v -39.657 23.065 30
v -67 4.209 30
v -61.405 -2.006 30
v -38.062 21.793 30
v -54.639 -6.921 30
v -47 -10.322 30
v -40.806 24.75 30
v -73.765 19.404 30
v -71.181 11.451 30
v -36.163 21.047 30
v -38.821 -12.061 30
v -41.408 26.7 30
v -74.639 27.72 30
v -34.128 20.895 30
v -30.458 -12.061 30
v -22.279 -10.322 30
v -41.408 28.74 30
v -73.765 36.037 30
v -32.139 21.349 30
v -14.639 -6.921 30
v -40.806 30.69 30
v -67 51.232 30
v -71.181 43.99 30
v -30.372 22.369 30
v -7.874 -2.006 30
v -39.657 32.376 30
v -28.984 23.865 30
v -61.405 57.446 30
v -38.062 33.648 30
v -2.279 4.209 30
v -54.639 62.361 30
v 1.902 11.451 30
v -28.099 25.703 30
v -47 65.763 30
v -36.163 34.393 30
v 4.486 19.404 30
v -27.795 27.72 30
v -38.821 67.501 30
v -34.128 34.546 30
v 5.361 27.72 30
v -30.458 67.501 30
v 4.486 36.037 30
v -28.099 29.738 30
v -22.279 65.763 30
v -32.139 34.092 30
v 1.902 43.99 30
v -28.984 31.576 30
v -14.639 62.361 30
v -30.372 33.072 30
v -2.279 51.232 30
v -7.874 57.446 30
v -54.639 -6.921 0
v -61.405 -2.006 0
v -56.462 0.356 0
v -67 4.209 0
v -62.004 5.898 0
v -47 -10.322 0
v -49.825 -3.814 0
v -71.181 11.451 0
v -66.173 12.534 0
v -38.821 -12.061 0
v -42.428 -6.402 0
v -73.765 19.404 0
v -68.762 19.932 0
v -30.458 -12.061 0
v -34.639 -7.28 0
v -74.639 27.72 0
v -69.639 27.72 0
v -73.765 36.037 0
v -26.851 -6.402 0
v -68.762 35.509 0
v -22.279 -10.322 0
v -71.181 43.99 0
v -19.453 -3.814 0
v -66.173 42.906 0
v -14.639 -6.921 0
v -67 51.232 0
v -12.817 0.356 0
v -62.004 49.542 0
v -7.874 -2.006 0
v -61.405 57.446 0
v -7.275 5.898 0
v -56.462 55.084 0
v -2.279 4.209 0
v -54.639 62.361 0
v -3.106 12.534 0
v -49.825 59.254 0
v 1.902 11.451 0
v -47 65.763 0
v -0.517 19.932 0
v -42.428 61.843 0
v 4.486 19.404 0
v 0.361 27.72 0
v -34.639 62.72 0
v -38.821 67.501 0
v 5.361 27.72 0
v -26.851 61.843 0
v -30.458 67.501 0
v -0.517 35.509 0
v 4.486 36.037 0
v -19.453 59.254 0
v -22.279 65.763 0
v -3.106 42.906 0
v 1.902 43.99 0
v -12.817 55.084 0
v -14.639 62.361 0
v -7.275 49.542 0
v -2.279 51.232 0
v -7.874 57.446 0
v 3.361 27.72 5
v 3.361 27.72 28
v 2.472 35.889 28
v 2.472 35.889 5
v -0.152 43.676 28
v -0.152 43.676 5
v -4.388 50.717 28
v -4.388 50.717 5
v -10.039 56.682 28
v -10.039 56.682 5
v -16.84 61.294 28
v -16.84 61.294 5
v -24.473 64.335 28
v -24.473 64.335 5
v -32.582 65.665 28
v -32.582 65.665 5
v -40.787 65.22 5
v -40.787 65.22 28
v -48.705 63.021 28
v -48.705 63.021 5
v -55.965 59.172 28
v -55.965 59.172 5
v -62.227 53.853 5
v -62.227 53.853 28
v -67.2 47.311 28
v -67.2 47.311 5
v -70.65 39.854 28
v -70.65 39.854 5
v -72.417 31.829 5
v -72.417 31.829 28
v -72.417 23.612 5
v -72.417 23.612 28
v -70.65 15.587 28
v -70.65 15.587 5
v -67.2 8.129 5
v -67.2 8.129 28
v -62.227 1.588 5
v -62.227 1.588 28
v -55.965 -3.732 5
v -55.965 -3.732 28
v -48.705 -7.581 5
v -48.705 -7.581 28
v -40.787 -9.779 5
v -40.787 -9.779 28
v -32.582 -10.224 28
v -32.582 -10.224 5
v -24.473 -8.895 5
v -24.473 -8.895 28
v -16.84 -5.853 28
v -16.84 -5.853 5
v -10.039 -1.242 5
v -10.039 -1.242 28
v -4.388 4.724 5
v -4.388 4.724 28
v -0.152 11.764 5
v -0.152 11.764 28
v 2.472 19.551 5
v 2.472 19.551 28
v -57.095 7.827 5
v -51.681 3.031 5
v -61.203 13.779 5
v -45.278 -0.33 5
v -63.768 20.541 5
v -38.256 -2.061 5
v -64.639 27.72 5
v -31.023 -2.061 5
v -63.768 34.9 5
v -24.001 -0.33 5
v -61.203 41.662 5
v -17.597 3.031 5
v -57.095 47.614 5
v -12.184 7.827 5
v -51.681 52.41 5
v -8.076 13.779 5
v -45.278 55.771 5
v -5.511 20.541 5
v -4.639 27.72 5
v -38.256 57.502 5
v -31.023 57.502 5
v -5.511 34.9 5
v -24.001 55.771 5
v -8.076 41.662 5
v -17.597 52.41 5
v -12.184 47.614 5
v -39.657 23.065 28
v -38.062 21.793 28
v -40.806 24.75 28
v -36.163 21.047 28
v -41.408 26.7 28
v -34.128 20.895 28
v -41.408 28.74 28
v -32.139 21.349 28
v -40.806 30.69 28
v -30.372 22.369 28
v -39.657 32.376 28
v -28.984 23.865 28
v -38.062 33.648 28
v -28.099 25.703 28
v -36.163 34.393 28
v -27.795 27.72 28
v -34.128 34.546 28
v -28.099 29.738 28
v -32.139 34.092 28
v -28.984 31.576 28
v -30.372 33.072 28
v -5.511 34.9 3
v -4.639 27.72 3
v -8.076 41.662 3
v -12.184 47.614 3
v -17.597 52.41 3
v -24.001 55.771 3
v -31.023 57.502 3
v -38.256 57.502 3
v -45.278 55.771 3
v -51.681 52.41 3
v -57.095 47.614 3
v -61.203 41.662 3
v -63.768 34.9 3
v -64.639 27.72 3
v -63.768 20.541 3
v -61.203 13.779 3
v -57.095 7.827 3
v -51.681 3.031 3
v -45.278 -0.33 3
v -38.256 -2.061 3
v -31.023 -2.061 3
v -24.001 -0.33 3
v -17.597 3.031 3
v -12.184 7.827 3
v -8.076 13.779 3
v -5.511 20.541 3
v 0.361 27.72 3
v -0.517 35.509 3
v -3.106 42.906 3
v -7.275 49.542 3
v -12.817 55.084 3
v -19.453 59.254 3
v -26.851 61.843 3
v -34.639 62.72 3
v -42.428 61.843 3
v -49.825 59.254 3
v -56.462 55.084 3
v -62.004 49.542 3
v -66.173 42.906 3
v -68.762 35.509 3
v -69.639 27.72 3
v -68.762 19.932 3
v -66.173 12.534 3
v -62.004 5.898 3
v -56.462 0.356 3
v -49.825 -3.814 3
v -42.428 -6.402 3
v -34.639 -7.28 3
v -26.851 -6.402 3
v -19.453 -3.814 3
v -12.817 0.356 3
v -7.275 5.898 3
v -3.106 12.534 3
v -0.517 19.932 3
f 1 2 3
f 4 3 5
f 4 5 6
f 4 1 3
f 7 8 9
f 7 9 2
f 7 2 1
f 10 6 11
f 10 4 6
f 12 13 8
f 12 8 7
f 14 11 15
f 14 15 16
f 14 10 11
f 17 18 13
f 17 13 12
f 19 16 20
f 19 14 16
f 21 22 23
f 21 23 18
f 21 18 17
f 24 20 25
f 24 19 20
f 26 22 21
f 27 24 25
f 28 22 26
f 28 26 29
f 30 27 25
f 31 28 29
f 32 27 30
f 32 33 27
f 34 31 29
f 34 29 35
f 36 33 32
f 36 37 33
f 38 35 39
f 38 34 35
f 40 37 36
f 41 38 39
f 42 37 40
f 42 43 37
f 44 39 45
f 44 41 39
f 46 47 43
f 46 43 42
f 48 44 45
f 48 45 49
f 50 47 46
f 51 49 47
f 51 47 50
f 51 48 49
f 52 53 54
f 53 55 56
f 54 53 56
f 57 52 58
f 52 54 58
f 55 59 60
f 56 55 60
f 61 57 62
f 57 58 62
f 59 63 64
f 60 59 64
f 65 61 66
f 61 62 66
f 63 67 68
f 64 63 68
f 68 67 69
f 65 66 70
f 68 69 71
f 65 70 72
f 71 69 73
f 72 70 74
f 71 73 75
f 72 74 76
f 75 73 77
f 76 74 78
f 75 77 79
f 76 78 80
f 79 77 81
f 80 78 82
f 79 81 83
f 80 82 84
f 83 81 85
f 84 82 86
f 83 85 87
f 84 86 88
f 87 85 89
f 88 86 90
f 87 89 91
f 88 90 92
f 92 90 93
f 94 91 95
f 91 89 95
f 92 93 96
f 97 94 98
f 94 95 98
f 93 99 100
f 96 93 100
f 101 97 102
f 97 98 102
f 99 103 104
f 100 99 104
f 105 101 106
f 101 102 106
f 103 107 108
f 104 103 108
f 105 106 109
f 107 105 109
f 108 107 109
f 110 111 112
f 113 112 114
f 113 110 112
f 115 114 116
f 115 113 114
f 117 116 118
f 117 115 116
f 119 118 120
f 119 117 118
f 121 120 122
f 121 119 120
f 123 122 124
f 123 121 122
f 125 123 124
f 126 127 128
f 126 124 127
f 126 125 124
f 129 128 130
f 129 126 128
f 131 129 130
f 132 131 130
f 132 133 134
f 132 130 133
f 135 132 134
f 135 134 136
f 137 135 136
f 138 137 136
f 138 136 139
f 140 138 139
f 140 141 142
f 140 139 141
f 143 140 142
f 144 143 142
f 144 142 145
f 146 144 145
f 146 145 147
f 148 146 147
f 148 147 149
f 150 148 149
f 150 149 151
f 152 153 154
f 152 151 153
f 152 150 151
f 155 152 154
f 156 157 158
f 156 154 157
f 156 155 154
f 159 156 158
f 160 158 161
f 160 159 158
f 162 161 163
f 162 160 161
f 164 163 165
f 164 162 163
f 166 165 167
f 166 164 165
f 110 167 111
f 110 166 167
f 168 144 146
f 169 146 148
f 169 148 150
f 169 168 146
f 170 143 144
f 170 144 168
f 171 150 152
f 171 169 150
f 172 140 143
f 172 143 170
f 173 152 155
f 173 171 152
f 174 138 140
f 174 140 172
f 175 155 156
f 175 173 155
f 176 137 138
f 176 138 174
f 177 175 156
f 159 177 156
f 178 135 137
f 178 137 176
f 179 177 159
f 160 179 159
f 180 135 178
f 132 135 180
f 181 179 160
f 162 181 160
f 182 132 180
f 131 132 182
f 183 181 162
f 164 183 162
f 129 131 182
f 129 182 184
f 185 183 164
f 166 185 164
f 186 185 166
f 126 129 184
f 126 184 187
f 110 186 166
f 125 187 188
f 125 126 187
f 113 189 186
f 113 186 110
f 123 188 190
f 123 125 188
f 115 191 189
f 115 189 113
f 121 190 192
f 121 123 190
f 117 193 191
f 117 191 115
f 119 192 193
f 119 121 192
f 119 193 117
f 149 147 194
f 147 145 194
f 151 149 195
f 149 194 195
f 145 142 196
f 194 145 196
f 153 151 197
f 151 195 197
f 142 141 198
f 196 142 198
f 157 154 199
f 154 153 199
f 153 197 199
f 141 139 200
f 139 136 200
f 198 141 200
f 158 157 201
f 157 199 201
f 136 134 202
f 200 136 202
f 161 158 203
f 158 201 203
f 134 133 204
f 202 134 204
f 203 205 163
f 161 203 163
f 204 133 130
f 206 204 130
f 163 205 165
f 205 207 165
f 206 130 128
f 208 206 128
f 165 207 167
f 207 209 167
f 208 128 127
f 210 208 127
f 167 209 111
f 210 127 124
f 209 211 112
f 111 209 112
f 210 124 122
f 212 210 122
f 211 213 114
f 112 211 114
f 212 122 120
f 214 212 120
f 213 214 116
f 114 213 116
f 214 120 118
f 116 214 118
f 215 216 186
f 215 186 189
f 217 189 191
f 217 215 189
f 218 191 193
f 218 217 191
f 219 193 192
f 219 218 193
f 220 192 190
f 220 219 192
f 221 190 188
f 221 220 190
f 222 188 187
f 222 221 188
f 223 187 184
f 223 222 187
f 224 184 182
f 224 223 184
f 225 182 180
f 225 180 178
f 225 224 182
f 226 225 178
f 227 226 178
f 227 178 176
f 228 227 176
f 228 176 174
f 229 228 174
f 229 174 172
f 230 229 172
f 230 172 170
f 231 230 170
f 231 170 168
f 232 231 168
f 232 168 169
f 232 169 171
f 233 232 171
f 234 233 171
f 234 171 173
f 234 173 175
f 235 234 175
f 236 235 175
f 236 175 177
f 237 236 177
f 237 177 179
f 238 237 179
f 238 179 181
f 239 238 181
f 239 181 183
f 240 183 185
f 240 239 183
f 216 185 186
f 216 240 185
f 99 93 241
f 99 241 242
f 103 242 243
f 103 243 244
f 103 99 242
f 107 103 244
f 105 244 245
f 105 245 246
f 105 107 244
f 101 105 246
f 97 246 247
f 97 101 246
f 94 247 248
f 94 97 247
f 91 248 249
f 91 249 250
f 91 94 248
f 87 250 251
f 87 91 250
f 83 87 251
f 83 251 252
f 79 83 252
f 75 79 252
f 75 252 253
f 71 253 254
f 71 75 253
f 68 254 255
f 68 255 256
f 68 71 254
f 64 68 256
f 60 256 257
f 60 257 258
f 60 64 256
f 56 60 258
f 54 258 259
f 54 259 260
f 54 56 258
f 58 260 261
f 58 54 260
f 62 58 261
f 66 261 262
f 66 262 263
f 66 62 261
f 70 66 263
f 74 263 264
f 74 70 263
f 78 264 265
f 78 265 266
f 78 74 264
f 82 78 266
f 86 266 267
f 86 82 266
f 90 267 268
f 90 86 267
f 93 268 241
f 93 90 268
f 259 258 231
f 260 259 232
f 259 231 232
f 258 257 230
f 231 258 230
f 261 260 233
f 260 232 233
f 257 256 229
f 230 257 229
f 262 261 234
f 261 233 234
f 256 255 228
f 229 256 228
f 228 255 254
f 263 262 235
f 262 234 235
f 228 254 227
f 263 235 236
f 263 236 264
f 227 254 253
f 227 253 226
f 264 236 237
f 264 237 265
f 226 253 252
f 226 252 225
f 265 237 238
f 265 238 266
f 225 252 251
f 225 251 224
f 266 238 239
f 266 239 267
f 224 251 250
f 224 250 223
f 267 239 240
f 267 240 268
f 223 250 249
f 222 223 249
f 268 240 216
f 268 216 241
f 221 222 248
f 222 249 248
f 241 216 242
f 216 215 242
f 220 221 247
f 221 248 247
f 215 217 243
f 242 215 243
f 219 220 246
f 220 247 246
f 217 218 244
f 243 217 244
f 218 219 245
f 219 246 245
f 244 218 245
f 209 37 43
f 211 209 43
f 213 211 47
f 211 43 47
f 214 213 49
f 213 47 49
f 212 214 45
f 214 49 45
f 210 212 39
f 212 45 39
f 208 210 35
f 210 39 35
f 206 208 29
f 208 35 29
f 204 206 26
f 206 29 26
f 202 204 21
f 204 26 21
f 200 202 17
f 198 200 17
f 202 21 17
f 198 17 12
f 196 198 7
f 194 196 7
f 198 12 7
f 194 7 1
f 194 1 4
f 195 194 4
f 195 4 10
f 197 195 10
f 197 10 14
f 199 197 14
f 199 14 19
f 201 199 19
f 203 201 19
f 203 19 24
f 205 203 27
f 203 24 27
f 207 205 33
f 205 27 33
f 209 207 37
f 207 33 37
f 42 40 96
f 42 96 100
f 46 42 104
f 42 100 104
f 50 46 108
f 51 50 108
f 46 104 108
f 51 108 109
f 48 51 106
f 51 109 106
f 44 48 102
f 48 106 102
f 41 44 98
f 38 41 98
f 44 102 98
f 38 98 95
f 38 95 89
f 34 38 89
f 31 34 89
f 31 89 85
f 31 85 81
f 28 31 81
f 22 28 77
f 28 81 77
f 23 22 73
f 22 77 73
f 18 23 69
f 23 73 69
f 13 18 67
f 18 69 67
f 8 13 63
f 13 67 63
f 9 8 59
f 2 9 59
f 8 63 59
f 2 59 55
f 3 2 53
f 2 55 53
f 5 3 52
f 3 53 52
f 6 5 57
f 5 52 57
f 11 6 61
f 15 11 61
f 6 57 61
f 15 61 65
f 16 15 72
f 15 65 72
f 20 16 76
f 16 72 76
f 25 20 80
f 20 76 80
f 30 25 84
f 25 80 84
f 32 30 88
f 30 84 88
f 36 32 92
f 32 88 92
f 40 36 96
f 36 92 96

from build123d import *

# Parameters (mm, degrees)
F0_R     = 40
F0_R_2   = 38
F1_DEPTH = 30
F0_R_3   = 35
F0_R_4   = 30
F2_DEPTH = 5
F3_DEPTH = 3
F4_R     = 39.94757
F4_R_2   = 38
F4_R_3   = 6.844731
F5_DEPTH = 2


with BuildPart() as f1:
    # F0 (on Top) → F1 (new body)
    with BuildSketch(Plane.XY):
        with Locations((-34.639411, 27.720276)):
            Circle(F0_R)
        with Locations((-34.639411, 27.720276)):
            Circle(F0_R_2, mode=Mode.SUBTRACT)
    extrude(amount=F1_DEPTH)

    # F0 (on Top) → F2 (join)
    with BuildSketch(Plane.XY):
        with Locations((-34.639411, 27.720276)):
            Circle(F0_R_2)
        with Locations((-34.639411, 27.720276)):
            Circle(F0_R_3, mode=Mode.SUBTRACT)
        with Locations((-34.639411, 27.720276)):
            Circle(F0_R_3)
        with Locations((-34.639411, 27.720276)):
            Circle(F0_R_4, mode=Mode.SUBTRACT)
    extrude(amount=F2_DEPTH)

    # F0 (on Top) → F3 (cut)
    with BuildSketch(Plane.XY):
        with Locations((-34.639411, 27.720276)):
            Circle(F0_R_3)
        with Locations((-34.639411, 27.720276)):
            Circle(F0_R_4, mode=Mode.SUBTRACT)
    extrude(amount=F3_DEPTH, mode=Mode.SUBTRACT)

    # F4 (on face) → F5 (join)
    with BuildSketch(Plane.XY.offset(30)):
        with Locations((-34.639411, 27.720276)):
            Circle(F4_R)
        with Locations((-34.639411, 27.720276)):
            Circle(F4_R_2, mode=Mode.SUBTRACT)
        with Locations((-34.639411, 27.720276)):
            Circle(F4_R_2)
        with Locations((-34.639411, 27.720276)):
            Circle(F4_R_3, mode=Mode.SUBTRACT)
    extrude(amount=-F5_DEPTH)


solid = f1.part
